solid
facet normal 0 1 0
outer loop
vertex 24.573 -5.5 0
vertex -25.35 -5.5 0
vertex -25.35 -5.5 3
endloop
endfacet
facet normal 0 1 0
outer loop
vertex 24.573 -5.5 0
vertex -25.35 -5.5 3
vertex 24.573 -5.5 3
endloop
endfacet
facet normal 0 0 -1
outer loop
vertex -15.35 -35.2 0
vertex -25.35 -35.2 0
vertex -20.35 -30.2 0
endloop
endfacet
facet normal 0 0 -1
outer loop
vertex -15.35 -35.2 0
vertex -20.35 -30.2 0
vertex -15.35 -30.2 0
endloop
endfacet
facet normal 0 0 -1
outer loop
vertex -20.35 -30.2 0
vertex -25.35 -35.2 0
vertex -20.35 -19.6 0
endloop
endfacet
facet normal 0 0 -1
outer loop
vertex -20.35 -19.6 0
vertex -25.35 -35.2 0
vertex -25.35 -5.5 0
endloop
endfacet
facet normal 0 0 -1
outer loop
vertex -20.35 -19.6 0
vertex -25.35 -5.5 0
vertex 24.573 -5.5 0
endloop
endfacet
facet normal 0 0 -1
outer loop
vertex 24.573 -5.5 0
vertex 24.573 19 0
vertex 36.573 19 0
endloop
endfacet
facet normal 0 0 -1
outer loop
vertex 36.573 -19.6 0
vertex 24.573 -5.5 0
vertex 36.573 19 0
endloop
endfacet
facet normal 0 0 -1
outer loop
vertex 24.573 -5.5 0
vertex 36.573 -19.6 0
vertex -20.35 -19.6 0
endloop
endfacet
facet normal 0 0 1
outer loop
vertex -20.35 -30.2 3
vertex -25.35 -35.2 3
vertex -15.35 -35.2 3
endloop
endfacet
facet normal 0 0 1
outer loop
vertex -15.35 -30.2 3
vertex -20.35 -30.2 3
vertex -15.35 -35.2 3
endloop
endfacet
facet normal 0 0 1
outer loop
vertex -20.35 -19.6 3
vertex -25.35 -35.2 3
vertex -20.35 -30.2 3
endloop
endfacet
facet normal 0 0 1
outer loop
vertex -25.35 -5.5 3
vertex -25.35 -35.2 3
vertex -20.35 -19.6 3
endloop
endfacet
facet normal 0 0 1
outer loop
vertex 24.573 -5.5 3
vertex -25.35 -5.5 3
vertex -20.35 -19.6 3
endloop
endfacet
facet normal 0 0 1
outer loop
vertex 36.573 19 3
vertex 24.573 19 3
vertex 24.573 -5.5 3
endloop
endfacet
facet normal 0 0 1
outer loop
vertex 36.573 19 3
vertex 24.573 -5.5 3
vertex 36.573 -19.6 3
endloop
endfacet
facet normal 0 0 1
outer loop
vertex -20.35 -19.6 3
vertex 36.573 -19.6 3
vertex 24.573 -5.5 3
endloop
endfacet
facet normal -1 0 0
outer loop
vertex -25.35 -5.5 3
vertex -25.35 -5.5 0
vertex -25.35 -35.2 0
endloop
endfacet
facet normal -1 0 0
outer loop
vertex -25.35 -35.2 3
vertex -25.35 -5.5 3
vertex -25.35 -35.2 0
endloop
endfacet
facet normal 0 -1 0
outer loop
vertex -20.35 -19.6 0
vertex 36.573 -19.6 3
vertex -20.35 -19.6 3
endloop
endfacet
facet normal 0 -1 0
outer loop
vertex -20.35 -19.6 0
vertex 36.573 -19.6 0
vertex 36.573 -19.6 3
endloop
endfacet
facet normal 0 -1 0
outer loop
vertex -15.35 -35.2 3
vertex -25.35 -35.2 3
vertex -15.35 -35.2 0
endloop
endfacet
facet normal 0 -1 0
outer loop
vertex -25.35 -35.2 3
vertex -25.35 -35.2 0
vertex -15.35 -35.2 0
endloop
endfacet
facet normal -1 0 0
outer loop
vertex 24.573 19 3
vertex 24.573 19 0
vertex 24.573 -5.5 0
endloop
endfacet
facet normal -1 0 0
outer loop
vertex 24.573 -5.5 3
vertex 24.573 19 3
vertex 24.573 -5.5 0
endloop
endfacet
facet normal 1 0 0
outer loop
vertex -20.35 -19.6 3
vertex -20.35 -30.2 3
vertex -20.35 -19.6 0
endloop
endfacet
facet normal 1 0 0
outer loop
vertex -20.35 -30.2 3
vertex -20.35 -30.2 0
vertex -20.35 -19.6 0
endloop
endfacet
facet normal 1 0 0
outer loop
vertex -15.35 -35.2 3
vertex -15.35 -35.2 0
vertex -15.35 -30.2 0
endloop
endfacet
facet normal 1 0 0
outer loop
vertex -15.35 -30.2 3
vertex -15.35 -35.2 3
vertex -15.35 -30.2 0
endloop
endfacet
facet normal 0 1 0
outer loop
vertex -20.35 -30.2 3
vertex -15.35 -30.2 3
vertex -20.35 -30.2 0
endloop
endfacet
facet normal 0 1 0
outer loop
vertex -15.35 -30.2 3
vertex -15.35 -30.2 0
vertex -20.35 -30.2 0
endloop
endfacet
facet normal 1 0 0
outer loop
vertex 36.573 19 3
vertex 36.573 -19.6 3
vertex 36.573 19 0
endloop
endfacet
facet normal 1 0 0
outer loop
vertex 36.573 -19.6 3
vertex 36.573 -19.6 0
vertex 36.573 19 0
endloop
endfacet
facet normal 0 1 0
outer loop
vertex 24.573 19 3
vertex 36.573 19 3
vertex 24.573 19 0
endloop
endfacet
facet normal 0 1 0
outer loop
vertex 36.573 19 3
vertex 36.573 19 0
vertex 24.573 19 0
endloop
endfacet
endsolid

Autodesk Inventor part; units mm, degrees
ref_plane "YZ Plane" through (0, 0, 0) normal (1, 0, 0) x (0, 1, 0)
ref_plane "XZ Plane" through (0, 0, 0) normal (0, 1, 0) x (-1, 0, 0)
ref_plane "XY Plane" through (0, 0, 0) normal (0, 0, 1) x (1, 0, 0)
ref_plane "Work Plane1" through (0, 0, 0) normal (0, 0, 1) x (1, 0, 0)
sketch "Sketch1" plane through (0, 0, 0) normal (0, 0, 1) x (1, 0, 0)
  line L0 (10, -5.5) -> (10, 39) construction
  line L1 (-10, 39) -> (10, 39) construction
  line L2 (-10, -5.5) -> (-10, 39) construction
  line L3 (-20.35, -5.5) -> (-10, -5.5) projected
  line L4 (-20.35, -19.6) -> (-20.35, -5.5) projected
  line L5 (20.35, -19.6) -> (-20.35, -19.6) projected
  line L6 (20.35, -19.6) -> (20.35, -5.5) projected
  line L7 (10, -5.5) -> (20.35, -5.5) projected
  line L8 (-20.35, -30.2) -> (-20.35, 45.6) projected
  line L9 (20.35, -30.2) -> (-20.35, -30.2) projected
  line L10 (-10, -5.5) -> (10, -5.5)
  line L11 (-20.35, -5.5) -> (-25.35, -5.5)
  line L12 (-25.35, -5.5) -> (-25.35, -35.2)
  line L13 (-25.35, -35.2) -> (-15.35, -35.2)
  line L14 (-15.35, -35.2) -> (-15.35, -30.2)
  line L15 (20.35, -19.6) -> (36.5729, -19.6)
  line L16 (36.5729, -19.6) -> (36.5729, 19)
  line L17 (36.5729, 19) -> (24.5729, 19)
  line L18 (24.5729, 19) -> (24.5729, -5.5)
  line L19 (24.5729, -5.5) -> (20.35, -5.5)
  line L20 (36.5729, 7) -> (24.5729, 7) construction
  line L21 (24.5729, 7) -> (24.5729, 19) construction
  line L22 (24.5729, 19) -> (36.5729, 19) construction
  line L23 (36.5729, 19) -> (36.5729, 7) construction
  point P0 (0, 0)
  dimension "d0" = 5
  dimension "d1" = 5
  dimension "d2" = 5
extrude "Extrusion1" add sketch "Sketch1" along normal blind 3
sketch "Sketch2" plane through (0, 0, 3) normal (0, 0, 1) x (1, 0, 0)
  line L0 (-15.35, -35.2) -> (-15.35, -30.2) projected
  line L1 (-15.35, -30.2) -> (-20.35, -30.2) projected
  line L2 (-20.35, -30.2) -> (-20.35, -19.6) projected
  line L3 (-20.35, -19.6) -> (36.5729, -19.6) projected
  line L4 (36.5729, -19.6) -> (36.5729, 19) projected
  line L5 (36.5729, 19) -> (24.5729, 19) projected
  line L6 (24.5729, 19) -> (24.5729, -5.5) projected
  line L7 (24.5729, -5.5) -> (-25.35, -5.5) projected
  line L8 (-25.35, -5.5) -> (-25.35, -35.2) projected
  line L9 (-25.35, -35.2) -> (-15.35, -35.2) projected
  point P0 (0, 0)
equation "\"d1\" = d0"
equation "\"d2\" = d0"
properties part number "Button Bracket 1" material "Wood (Oak)"
